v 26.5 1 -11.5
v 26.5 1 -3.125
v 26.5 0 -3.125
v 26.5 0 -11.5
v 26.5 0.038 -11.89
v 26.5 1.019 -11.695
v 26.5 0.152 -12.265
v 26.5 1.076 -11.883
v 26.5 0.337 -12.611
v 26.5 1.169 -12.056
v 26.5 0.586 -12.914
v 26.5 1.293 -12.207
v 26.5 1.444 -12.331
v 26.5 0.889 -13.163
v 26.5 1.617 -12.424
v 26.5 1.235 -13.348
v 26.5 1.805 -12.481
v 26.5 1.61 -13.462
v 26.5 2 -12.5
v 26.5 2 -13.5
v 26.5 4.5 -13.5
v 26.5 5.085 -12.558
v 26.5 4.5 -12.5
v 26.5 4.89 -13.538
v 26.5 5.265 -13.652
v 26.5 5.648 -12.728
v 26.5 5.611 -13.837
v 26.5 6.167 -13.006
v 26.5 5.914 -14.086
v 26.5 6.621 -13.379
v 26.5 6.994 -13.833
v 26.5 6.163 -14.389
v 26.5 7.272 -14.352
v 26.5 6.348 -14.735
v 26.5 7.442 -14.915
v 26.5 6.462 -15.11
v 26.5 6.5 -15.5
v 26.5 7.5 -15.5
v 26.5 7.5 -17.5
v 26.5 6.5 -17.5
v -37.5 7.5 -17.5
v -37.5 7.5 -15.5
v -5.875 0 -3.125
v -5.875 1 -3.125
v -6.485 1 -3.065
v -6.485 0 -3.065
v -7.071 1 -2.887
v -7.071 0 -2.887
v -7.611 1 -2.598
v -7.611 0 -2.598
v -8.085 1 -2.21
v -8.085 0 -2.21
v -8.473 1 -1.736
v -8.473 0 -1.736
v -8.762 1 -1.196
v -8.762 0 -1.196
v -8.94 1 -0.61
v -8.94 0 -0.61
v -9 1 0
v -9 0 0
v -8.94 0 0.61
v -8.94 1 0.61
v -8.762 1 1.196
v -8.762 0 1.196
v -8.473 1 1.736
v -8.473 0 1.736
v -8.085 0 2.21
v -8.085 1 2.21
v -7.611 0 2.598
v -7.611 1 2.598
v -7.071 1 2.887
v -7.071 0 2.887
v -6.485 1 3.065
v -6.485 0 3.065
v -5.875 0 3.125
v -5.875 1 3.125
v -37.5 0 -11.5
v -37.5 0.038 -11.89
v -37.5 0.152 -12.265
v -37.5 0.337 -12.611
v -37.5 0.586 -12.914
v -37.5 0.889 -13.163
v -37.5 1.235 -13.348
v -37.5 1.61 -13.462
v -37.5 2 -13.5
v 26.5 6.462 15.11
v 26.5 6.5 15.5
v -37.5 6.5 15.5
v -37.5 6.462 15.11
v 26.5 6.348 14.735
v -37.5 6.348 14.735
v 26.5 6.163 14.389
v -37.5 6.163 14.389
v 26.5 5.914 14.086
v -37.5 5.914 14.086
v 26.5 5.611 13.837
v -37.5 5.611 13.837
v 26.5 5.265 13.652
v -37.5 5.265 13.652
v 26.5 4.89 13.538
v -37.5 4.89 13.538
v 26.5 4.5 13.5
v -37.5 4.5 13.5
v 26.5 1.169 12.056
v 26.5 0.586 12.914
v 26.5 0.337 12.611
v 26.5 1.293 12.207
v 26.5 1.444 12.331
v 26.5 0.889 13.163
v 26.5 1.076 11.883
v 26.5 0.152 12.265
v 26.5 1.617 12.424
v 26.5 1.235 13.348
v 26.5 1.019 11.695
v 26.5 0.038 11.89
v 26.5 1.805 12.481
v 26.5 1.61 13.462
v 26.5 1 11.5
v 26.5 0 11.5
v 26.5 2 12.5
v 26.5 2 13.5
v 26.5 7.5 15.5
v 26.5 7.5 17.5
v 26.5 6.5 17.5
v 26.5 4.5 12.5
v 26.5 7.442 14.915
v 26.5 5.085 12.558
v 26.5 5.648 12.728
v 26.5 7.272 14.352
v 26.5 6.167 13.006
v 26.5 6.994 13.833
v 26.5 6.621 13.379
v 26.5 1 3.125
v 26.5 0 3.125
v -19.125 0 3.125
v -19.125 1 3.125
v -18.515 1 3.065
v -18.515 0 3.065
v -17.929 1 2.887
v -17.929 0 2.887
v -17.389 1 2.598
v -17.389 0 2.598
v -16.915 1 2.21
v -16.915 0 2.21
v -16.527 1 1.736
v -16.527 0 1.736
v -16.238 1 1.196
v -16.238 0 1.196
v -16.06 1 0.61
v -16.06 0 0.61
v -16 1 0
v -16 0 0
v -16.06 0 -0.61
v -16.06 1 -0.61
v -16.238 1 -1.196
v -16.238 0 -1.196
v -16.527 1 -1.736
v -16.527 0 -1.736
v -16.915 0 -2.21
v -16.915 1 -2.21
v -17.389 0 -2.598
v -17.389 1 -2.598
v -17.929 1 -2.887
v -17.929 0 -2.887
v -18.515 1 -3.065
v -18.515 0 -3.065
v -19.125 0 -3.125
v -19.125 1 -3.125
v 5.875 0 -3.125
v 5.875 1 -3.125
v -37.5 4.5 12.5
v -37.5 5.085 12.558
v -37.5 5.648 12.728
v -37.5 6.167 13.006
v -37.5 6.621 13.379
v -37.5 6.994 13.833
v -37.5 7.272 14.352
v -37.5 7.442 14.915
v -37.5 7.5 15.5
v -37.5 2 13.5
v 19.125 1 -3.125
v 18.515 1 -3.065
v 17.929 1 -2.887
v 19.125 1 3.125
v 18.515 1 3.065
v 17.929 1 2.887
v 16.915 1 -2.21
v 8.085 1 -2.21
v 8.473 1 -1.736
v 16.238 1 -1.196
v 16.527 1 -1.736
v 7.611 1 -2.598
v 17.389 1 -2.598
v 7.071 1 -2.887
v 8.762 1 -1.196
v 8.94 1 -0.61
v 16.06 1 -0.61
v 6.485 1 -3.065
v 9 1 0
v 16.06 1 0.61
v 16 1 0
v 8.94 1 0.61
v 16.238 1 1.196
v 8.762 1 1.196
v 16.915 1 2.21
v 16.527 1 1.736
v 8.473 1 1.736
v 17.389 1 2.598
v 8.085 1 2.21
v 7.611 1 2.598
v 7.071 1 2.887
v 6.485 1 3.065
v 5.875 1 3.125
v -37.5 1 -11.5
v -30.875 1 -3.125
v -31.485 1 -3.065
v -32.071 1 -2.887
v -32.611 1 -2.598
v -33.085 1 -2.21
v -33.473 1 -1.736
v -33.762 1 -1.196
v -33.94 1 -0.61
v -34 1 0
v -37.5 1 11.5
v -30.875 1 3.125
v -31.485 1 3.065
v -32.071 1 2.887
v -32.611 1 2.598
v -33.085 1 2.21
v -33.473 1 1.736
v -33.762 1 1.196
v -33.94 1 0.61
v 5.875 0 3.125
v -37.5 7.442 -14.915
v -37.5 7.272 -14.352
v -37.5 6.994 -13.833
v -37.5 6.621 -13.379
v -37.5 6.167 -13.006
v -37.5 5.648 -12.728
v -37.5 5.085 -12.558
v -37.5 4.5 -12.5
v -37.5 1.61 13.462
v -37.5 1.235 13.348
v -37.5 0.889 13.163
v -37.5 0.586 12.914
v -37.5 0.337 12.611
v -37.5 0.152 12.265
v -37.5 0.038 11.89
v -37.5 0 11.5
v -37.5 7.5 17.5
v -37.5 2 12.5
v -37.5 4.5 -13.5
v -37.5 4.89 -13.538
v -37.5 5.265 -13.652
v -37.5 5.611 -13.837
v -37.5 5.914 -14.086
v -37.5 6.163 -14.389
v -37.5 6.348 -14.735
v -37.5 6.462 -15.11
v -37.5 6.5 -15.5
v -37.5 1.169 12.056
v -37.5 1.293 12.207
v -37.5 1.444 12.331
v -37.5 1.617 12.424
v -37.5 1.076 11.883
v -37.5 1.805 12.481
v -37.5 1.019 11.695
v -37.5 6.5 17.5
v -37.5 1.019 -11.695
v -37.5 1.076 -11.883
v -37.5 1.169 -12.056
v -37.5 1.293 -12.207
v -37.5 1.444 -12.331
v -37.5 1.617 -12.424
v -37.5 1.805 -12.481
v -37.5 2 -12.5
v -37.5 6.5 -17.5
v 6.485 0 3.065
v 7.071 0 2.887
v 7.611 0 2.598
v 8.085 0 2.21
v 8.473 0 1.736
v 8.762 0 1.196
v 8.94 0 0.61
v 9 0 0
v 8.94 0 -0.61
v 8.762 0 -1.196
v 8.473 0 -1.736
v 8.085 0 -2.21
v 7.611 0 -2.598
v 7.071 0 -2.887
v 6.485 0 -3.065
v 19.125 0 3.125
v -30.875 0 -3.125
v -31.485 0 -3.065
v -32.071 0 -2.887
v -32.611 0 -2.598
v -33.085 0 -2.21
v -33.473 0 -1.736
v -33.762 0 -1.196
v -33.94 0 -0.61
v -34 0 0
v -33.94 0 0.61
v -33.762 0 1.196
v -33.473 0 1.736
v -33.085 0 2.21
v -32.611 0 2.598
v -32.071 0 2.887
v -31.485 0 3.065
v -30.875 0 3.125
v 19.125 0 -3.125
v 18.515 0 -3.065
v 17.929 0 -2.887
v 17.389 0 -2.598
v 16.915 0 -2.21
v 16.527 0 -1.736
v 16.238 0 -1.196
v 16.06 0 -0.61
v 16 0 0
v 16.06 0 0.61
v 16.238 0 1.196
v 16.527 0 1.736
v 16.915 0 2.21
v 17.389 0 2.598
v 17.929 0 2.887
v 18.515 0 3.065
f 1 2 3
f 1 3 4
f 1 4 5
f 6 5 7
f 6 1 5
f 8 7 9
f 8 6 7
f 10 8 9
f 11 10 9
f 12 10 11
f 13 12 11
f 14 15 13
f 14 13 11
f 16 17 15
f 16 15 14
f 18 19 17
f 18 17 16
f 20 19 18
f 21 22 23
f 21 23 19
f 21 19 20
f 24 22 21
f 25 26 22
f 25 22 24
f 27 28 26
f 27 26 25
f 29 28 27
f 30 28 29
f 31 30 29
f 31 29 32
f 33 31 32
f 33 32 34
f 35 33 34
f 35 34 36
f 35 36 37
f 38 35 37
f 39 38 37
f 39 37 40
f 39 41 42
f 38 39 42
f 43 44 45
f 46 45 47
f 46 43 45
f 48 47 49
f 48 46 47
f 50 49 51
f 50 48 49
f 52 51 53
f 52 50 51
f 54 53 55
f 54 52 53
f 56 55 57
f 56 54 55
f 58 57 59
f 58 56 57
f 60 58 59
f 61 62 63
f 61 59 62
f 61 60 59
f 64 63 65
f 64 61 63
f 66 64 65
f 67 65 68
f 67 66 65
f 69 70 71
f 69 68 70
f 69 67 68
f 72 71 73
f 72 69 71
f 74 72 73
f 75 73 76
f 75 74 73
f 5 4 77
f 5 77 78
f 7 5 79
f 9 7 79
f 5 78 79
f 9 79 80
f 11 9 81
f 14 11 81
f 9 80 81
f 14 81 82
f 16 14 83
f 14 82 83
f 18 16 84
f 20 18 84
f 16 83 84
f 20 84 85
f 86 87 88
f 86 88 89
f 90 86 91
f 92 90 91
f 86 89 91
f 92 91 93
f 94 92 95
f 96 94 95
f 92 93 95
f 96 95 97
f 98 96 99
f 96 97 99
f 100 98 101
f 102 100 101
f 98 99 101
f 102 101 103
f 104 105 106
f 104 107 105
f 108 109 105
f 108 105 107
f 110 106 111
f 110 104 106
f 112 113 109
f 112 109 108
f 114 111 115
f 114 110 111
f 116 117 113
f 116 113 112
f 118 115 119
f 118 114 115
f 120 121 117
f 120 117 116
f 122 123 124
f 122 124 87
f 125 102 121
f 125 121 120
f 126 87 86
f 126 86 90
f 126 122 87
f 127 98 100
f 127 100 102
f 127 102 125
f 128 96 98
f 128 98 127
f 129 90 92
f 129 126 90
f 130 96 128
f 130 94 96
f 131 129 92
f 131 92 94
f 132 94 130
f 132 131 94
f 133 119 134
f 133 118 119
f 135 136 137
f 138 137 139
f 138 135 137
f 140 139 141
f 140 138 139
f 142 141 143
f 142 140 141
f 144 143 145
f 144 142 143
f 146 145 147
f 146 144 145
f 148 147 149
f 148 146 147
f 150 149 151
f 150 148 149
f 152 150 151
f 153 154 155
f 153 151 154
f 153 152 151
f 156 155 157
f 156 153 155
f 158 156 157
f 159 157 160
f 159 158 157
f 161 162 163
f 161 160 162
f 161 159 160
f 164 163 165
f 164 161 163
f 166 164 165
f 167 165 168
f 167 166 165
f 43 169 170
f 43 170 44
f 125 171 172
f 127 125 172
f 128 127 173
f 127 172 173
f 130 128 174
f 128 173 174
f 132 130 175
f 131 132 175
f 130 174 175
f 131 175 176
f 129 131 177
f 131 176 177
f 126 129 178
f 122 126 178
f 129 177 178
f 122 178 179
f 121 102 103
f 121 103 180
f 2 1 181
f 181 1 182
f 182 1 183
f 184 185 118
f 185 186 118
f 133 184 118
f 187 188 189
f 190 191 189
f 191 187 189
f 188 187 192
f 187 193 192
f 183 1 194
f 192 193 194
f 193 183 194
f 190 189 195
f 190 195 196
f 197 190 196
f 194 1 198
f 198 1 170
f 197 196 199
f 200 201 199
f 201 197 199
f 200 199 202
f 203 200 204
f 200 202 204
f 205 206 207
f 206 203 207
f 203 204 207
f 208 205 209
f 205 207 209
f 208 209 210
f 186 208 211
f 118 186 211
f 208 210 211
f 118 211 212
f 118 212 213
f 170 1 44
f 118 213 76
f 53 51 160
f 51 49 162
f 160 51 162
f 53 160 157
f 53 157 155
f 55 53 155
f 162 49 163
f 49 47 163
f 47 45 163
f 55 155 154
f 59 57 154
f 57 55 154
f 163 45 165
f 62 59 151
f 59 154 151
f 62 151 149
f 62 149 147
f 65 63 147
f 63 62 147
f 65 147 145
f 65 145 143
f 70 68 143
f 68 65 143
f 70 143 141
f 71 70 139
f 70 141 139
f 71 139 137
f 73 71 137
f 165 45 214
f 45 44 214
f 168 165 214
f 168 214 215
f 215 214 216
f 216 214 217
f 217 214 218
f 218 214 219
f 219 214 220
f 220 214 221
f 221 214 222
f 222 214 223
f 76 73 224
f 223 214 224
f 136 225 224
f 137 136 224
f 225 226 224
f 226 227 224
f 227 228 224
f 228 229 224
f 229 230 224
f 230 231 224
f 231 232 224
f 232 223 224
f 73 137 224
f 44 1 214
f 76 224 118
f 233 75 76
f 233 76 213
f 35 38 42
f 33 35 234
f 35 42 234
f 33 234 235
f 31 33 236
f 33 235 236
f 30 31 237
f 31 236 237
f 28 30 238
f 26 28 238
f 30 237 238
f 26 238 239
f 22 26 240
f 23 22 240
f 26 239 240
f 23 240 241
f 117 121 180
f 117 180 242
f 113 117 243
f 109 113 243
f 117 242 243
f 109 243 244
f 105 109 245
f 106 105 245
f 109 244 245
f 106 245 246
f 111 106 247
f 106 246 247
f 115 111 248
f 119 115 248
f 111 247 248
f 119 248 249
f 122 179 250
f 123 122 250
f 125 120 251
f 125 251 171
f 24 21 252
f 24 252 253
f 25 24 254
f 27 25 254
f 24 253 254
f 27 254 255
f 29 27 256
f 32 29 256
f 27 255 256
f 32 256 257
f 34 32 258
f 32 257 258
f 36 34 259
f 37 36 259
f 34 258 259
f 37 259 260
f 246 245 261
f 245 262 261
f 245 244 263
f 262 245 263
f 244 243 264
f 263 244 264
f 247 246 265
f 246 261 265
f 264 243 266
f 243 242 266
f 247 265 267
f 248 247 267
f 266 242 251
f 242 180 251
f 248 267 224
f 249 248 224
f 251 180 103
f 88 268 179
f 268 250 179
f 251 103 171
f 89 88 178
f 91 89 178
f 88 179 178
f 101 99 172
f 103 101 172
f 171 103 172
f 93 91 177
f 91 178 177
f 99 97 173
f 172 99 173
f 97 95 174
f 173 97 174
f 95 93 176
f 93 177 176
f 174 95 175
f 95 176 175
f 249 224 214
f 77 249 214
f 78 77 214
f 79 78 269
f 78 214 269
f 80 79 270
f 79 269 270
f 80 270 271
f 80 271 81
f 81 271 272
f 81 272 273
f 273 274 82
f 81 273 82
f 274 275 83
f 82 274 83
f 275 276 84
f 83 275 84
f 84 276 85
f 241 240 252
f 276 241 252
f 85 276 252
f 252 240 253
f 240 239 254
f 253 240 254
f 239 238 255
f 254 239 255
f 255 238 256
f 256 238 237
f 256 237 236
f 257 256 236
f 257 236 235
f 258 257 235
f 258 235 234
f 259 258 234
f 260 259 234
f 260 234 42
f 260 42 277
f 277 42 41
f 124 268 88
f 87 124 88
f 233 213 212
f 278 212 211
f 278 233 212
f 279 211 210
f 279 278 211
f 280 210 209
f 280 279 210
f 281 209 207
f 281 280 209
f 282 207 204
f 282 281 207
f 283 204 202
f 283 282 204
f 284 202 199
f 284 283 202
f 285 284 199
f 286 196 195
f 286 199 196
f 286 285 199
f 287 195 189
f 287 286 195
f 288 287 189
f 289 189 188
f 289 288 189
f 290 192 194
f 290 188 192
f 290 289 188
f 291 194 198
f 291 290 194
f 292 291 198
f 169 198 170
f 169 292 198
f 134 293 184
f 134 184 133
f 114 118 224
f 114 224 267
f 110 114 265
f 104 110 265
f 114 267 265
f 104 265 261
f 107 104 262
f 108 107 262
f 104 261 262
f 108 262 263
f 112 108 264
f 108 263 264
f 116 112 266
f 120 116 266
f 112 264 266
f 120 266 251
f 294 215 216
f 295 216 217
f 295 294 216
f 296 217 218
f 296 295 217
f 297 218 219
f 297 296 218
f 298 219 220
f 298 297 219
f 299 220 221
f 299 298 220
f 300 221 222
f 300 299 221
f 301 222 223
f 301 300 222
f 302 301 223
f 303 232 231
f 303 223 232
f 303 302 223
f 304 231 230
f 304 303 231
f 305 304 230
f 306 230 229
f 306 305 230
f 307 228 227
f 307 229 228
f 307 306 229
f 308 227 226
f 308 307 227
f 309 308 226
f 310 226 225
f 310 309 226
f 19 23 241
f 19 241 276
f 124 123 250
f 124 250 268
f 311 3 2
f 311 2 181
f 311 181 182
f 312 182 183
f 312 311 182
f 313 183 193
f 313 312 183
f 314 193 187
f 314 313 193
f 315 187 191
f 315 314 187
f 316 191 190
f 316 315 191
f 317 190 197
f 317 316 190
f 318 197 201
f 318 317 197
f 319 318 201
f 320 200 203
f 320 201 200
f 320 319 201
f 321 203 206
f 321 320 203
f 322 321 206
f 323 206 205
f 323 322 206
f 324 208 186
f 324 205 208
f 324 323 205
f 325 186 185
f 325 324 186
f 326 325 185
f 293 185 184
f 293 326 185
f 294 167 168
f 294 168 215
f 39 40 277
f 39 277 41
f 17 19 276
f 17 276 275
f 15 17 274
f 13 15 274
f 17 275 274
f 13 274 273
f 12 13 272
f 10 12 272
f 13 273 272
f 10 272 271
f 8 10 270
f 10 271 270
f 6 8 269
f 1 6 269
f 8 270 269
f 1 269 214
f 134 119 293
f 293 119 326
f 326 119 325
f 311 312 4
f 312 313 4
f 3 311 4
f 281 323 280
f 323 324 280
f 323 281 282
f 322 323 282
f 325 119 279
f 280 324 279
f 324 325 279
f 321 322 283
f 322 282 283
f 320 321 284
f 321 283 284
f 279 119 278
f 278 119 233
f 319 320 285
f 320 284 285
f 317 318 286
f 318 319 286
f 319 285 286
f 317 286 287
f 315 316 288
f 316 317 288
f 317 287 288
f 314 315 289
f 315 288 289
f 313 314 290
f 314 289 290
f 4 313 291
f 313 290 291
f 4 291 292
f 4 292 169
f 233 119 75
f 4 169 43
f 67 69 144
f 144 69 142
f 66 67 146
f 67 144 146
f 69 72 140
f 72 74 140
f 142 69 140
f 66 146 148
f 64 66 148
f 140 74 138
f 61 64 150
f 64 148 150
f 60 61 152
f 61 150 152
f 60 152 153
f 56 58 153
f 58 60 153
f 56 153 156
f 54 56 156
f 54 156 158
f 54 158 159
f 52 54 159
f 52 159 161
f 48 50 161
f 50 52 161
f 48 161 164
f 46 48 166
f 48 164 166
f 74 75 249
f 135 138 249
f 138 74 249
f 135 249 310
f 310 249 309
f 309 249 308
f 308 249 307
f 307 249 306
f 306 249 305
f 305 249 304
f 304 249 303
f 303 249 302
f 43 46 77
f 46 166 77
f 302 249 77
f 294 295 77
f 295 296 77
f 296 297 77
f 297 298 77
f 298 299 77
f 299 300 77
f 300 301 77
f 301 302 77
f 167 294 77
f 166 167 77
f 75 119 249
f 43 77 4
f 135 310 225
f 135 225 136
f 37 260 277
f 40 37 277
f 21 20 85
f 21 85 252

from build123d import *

# Parameters (mm, degrees)
EXTRUDE_THIN1_DEPTH             = 37.5
EXTRUDE_THIN1_DEPTH_BACK        = 37.5
CUT_EXTRUDE1_REACH              = 44.057
LPATTERN1_COUNT                 = 2
LPATTERN1_PITCH                 = 25
LPATTERN1_COL_COUNT             = 2
LPATTERN1_COL_PITCH             = 25
SCHNITT_LINEAR_START            = -11
SCHNITT_LINEAR_AUSTRAGEN1_DEPTH = 11


with BuildPart() as part:
    # Sketch1 → Extrude-Thin1 (new, two sides: drawn at the far end of the back side and taken through both)
    with BuildSketch(Plane(origin=(0, 0, 0), x_dir=(0, 0, -1), z_dir=(1, 0, 0)).offset(-EXTRUDE_THIN1_DEPTH_BACK)):
        with BuildLine():
            Line((-17.5, 6.5), (-15.5, 6.5))
            ThreePointArc((-15.5, 6.5), (-14.085786438, 5.914213562), (-13.5, 4.5))
            Line((-13.5, 4.5), (-13.5, 2))
            ThreePointArc((-13.5, 2), (-12.914213562, 0.585786438), (-11.5, 0))
            Line((-11.5, 0), (11.5, 0))
            ThreePointArc((11.5, 0), (12.914213562, 0.585786438), (13.5, 2))
            Line((13.5, 2), (13.5, 4.5))
            ThreePointArc((13.5, 4.5), (14.085786438, 5.914213562), (15.5, 6.5))
            Line((15.5, 6.5), (17.5, 6.5))
            Line((17.5, 6.5), (17.5, 7.5))
            Line((17.5, 7.5), (15.5, 7.5))
            ThreePointArc((15.5, 7.5), (13.378679656, 6.621320344), (12.5, 4.5))
            Line((12.5, 4.5), (12.5, 2))
            ThreePointArc((12.5, 2), (12.207106781, 1.292893219), (11.5, 1))
            Line((11.5, 1), (-11.5, 1))
            ThreePointArc((-11.5, 1), (-12.207106781, 1.292893219), (-12.5, 2))
            Line((-12.5, 2), (-12.5, 4.5))
            ThreePointArc((-12.5, 4.5), (-13.378679656, 6.621320344), (-15.5, 7.5))
            Line((-15.5, 7.5), (-17.5, 7.5))
            Line((-17.5, 7.5), (-17.5, 6.5))
        make_face()
    extrude(amount=EXTRUDE_THIN1_DEPTH + EXTRUDE_THIN1_DEPTH_BACK)

    # Sketch2 → Cut-Extrude1 (cut, up to next)
    with BuildSketch(Plane.XZ, mode=Mode.PRIVATE) as cut_extrude1_sk1:
        with BuildLine():
            Line((-5.875, 3.125), (5.875, 3.125))
            ThreePointArc((5.875, 3.125), (9, 0), (5.875, -3.125))
            Line((5.875, -3.125), (-5.875, -3.125))
            ThreePointArc((-5.875, -3.125), (-9, 0), (-5.875, 3.125))
        make_face()
    cut_extrude1_tool1 = extrude(cut_extrude1_sk1.sketch, amount=-CUT_EXTRUDE1_REACH, mode=Mode.PRIVATE) & part.part
    cut_extrude1 = cut_extrude1_tool1.solids().sort_by_distance((0, 0, 0))[0]
    add(cut_extrude1, mode=Mode.SUBTRACT)

    # LPattern1: Cut-Extrude1 ×2
    with Locations(*[(i * LPATTERN1_PITCH, 0, 0) for i in range(1, LPATTERN1_COUNT)]):
        add(cut_extrude1, mode=Mode.SUBTRACT)

    # LPattern1 col: Cut-Extrude1 ×2
    with Locations(*[(-i * LPATTERN1_COL_PITCH, 0, 0) for i in range(1, LPATTERN1_COL_COUNT)]):
        add(cut_extrude1, mode=Mode.SUBTRACT)

    # Skizze1 → Schnitt-Linear austragen1 (cut)
    with BuildSketch(Plane(origin=(37.5, 0, 0), x_dir=(0, 0, -1), z_dir=(1, 0, 0)).offset(SCHNITT_LINEAR_START)):
        with BuildLine():
            Line((-15.5, 7.5), (-17.5, 7.5))
            Line((-17.5, 7.5), (-17.5, 6.5))
            Line((-17.5, 6.5), (-15.5, 6.5))
            ThreePointArc((-15.5, 6.5), (-14.085786438, 5.914213562), (-13.5, 4.5))
            Line((-13.5, 4.5), (-13.5, 2))
            ThreePointArc((-13.5, 2), (-12.914213562, 0.585786438), (-11.5, 0))
            Line((-11.5, 0), (11.5, 0))
            ThreePointArc((11.5, 0), (12.914213562, 0.585786438), (13.5, 2))
            Line((13.5, 2), (13.5, 4.5))
            ThreePointArc((13.5, 4.5), (14.085786438, 5.914213562), (15.5, 6.5))
            Line((15.5, 6.5), (17.5, 6.5))
            Line((17.5, 6.5), (17.5, 7.5))
            Line((17.5, 7.5), (15.5, 7.5))
            ThreePointArc((15.5, 7.5), (13.378679656, 6.621320344), (12.5, 4.5))
            Line((12.5, 4.5), (12.5, 2))
            ThreePointArc((12.5, 2), (12.207106781, 1.292893219), (11.5, 1))
            Line((11.5, 1), (-11.5, 1))
            ThreePointArc((-11.5, 1), (-12.207106781, 1.292893219), (-12.5, 2))
            Line((-12.5, 2), (-12.5, 4.5))
            ThreePointArc((-12.5, 4.5), (-13.378679656, 6.621320344), (-15.5, 7.5))
        make_face()
    extrude(amount=SCHNITT_LINEAR_AUSTRAGEN1_DEPTH, mode=Mode.SUBTRACT)


solid = part.part
